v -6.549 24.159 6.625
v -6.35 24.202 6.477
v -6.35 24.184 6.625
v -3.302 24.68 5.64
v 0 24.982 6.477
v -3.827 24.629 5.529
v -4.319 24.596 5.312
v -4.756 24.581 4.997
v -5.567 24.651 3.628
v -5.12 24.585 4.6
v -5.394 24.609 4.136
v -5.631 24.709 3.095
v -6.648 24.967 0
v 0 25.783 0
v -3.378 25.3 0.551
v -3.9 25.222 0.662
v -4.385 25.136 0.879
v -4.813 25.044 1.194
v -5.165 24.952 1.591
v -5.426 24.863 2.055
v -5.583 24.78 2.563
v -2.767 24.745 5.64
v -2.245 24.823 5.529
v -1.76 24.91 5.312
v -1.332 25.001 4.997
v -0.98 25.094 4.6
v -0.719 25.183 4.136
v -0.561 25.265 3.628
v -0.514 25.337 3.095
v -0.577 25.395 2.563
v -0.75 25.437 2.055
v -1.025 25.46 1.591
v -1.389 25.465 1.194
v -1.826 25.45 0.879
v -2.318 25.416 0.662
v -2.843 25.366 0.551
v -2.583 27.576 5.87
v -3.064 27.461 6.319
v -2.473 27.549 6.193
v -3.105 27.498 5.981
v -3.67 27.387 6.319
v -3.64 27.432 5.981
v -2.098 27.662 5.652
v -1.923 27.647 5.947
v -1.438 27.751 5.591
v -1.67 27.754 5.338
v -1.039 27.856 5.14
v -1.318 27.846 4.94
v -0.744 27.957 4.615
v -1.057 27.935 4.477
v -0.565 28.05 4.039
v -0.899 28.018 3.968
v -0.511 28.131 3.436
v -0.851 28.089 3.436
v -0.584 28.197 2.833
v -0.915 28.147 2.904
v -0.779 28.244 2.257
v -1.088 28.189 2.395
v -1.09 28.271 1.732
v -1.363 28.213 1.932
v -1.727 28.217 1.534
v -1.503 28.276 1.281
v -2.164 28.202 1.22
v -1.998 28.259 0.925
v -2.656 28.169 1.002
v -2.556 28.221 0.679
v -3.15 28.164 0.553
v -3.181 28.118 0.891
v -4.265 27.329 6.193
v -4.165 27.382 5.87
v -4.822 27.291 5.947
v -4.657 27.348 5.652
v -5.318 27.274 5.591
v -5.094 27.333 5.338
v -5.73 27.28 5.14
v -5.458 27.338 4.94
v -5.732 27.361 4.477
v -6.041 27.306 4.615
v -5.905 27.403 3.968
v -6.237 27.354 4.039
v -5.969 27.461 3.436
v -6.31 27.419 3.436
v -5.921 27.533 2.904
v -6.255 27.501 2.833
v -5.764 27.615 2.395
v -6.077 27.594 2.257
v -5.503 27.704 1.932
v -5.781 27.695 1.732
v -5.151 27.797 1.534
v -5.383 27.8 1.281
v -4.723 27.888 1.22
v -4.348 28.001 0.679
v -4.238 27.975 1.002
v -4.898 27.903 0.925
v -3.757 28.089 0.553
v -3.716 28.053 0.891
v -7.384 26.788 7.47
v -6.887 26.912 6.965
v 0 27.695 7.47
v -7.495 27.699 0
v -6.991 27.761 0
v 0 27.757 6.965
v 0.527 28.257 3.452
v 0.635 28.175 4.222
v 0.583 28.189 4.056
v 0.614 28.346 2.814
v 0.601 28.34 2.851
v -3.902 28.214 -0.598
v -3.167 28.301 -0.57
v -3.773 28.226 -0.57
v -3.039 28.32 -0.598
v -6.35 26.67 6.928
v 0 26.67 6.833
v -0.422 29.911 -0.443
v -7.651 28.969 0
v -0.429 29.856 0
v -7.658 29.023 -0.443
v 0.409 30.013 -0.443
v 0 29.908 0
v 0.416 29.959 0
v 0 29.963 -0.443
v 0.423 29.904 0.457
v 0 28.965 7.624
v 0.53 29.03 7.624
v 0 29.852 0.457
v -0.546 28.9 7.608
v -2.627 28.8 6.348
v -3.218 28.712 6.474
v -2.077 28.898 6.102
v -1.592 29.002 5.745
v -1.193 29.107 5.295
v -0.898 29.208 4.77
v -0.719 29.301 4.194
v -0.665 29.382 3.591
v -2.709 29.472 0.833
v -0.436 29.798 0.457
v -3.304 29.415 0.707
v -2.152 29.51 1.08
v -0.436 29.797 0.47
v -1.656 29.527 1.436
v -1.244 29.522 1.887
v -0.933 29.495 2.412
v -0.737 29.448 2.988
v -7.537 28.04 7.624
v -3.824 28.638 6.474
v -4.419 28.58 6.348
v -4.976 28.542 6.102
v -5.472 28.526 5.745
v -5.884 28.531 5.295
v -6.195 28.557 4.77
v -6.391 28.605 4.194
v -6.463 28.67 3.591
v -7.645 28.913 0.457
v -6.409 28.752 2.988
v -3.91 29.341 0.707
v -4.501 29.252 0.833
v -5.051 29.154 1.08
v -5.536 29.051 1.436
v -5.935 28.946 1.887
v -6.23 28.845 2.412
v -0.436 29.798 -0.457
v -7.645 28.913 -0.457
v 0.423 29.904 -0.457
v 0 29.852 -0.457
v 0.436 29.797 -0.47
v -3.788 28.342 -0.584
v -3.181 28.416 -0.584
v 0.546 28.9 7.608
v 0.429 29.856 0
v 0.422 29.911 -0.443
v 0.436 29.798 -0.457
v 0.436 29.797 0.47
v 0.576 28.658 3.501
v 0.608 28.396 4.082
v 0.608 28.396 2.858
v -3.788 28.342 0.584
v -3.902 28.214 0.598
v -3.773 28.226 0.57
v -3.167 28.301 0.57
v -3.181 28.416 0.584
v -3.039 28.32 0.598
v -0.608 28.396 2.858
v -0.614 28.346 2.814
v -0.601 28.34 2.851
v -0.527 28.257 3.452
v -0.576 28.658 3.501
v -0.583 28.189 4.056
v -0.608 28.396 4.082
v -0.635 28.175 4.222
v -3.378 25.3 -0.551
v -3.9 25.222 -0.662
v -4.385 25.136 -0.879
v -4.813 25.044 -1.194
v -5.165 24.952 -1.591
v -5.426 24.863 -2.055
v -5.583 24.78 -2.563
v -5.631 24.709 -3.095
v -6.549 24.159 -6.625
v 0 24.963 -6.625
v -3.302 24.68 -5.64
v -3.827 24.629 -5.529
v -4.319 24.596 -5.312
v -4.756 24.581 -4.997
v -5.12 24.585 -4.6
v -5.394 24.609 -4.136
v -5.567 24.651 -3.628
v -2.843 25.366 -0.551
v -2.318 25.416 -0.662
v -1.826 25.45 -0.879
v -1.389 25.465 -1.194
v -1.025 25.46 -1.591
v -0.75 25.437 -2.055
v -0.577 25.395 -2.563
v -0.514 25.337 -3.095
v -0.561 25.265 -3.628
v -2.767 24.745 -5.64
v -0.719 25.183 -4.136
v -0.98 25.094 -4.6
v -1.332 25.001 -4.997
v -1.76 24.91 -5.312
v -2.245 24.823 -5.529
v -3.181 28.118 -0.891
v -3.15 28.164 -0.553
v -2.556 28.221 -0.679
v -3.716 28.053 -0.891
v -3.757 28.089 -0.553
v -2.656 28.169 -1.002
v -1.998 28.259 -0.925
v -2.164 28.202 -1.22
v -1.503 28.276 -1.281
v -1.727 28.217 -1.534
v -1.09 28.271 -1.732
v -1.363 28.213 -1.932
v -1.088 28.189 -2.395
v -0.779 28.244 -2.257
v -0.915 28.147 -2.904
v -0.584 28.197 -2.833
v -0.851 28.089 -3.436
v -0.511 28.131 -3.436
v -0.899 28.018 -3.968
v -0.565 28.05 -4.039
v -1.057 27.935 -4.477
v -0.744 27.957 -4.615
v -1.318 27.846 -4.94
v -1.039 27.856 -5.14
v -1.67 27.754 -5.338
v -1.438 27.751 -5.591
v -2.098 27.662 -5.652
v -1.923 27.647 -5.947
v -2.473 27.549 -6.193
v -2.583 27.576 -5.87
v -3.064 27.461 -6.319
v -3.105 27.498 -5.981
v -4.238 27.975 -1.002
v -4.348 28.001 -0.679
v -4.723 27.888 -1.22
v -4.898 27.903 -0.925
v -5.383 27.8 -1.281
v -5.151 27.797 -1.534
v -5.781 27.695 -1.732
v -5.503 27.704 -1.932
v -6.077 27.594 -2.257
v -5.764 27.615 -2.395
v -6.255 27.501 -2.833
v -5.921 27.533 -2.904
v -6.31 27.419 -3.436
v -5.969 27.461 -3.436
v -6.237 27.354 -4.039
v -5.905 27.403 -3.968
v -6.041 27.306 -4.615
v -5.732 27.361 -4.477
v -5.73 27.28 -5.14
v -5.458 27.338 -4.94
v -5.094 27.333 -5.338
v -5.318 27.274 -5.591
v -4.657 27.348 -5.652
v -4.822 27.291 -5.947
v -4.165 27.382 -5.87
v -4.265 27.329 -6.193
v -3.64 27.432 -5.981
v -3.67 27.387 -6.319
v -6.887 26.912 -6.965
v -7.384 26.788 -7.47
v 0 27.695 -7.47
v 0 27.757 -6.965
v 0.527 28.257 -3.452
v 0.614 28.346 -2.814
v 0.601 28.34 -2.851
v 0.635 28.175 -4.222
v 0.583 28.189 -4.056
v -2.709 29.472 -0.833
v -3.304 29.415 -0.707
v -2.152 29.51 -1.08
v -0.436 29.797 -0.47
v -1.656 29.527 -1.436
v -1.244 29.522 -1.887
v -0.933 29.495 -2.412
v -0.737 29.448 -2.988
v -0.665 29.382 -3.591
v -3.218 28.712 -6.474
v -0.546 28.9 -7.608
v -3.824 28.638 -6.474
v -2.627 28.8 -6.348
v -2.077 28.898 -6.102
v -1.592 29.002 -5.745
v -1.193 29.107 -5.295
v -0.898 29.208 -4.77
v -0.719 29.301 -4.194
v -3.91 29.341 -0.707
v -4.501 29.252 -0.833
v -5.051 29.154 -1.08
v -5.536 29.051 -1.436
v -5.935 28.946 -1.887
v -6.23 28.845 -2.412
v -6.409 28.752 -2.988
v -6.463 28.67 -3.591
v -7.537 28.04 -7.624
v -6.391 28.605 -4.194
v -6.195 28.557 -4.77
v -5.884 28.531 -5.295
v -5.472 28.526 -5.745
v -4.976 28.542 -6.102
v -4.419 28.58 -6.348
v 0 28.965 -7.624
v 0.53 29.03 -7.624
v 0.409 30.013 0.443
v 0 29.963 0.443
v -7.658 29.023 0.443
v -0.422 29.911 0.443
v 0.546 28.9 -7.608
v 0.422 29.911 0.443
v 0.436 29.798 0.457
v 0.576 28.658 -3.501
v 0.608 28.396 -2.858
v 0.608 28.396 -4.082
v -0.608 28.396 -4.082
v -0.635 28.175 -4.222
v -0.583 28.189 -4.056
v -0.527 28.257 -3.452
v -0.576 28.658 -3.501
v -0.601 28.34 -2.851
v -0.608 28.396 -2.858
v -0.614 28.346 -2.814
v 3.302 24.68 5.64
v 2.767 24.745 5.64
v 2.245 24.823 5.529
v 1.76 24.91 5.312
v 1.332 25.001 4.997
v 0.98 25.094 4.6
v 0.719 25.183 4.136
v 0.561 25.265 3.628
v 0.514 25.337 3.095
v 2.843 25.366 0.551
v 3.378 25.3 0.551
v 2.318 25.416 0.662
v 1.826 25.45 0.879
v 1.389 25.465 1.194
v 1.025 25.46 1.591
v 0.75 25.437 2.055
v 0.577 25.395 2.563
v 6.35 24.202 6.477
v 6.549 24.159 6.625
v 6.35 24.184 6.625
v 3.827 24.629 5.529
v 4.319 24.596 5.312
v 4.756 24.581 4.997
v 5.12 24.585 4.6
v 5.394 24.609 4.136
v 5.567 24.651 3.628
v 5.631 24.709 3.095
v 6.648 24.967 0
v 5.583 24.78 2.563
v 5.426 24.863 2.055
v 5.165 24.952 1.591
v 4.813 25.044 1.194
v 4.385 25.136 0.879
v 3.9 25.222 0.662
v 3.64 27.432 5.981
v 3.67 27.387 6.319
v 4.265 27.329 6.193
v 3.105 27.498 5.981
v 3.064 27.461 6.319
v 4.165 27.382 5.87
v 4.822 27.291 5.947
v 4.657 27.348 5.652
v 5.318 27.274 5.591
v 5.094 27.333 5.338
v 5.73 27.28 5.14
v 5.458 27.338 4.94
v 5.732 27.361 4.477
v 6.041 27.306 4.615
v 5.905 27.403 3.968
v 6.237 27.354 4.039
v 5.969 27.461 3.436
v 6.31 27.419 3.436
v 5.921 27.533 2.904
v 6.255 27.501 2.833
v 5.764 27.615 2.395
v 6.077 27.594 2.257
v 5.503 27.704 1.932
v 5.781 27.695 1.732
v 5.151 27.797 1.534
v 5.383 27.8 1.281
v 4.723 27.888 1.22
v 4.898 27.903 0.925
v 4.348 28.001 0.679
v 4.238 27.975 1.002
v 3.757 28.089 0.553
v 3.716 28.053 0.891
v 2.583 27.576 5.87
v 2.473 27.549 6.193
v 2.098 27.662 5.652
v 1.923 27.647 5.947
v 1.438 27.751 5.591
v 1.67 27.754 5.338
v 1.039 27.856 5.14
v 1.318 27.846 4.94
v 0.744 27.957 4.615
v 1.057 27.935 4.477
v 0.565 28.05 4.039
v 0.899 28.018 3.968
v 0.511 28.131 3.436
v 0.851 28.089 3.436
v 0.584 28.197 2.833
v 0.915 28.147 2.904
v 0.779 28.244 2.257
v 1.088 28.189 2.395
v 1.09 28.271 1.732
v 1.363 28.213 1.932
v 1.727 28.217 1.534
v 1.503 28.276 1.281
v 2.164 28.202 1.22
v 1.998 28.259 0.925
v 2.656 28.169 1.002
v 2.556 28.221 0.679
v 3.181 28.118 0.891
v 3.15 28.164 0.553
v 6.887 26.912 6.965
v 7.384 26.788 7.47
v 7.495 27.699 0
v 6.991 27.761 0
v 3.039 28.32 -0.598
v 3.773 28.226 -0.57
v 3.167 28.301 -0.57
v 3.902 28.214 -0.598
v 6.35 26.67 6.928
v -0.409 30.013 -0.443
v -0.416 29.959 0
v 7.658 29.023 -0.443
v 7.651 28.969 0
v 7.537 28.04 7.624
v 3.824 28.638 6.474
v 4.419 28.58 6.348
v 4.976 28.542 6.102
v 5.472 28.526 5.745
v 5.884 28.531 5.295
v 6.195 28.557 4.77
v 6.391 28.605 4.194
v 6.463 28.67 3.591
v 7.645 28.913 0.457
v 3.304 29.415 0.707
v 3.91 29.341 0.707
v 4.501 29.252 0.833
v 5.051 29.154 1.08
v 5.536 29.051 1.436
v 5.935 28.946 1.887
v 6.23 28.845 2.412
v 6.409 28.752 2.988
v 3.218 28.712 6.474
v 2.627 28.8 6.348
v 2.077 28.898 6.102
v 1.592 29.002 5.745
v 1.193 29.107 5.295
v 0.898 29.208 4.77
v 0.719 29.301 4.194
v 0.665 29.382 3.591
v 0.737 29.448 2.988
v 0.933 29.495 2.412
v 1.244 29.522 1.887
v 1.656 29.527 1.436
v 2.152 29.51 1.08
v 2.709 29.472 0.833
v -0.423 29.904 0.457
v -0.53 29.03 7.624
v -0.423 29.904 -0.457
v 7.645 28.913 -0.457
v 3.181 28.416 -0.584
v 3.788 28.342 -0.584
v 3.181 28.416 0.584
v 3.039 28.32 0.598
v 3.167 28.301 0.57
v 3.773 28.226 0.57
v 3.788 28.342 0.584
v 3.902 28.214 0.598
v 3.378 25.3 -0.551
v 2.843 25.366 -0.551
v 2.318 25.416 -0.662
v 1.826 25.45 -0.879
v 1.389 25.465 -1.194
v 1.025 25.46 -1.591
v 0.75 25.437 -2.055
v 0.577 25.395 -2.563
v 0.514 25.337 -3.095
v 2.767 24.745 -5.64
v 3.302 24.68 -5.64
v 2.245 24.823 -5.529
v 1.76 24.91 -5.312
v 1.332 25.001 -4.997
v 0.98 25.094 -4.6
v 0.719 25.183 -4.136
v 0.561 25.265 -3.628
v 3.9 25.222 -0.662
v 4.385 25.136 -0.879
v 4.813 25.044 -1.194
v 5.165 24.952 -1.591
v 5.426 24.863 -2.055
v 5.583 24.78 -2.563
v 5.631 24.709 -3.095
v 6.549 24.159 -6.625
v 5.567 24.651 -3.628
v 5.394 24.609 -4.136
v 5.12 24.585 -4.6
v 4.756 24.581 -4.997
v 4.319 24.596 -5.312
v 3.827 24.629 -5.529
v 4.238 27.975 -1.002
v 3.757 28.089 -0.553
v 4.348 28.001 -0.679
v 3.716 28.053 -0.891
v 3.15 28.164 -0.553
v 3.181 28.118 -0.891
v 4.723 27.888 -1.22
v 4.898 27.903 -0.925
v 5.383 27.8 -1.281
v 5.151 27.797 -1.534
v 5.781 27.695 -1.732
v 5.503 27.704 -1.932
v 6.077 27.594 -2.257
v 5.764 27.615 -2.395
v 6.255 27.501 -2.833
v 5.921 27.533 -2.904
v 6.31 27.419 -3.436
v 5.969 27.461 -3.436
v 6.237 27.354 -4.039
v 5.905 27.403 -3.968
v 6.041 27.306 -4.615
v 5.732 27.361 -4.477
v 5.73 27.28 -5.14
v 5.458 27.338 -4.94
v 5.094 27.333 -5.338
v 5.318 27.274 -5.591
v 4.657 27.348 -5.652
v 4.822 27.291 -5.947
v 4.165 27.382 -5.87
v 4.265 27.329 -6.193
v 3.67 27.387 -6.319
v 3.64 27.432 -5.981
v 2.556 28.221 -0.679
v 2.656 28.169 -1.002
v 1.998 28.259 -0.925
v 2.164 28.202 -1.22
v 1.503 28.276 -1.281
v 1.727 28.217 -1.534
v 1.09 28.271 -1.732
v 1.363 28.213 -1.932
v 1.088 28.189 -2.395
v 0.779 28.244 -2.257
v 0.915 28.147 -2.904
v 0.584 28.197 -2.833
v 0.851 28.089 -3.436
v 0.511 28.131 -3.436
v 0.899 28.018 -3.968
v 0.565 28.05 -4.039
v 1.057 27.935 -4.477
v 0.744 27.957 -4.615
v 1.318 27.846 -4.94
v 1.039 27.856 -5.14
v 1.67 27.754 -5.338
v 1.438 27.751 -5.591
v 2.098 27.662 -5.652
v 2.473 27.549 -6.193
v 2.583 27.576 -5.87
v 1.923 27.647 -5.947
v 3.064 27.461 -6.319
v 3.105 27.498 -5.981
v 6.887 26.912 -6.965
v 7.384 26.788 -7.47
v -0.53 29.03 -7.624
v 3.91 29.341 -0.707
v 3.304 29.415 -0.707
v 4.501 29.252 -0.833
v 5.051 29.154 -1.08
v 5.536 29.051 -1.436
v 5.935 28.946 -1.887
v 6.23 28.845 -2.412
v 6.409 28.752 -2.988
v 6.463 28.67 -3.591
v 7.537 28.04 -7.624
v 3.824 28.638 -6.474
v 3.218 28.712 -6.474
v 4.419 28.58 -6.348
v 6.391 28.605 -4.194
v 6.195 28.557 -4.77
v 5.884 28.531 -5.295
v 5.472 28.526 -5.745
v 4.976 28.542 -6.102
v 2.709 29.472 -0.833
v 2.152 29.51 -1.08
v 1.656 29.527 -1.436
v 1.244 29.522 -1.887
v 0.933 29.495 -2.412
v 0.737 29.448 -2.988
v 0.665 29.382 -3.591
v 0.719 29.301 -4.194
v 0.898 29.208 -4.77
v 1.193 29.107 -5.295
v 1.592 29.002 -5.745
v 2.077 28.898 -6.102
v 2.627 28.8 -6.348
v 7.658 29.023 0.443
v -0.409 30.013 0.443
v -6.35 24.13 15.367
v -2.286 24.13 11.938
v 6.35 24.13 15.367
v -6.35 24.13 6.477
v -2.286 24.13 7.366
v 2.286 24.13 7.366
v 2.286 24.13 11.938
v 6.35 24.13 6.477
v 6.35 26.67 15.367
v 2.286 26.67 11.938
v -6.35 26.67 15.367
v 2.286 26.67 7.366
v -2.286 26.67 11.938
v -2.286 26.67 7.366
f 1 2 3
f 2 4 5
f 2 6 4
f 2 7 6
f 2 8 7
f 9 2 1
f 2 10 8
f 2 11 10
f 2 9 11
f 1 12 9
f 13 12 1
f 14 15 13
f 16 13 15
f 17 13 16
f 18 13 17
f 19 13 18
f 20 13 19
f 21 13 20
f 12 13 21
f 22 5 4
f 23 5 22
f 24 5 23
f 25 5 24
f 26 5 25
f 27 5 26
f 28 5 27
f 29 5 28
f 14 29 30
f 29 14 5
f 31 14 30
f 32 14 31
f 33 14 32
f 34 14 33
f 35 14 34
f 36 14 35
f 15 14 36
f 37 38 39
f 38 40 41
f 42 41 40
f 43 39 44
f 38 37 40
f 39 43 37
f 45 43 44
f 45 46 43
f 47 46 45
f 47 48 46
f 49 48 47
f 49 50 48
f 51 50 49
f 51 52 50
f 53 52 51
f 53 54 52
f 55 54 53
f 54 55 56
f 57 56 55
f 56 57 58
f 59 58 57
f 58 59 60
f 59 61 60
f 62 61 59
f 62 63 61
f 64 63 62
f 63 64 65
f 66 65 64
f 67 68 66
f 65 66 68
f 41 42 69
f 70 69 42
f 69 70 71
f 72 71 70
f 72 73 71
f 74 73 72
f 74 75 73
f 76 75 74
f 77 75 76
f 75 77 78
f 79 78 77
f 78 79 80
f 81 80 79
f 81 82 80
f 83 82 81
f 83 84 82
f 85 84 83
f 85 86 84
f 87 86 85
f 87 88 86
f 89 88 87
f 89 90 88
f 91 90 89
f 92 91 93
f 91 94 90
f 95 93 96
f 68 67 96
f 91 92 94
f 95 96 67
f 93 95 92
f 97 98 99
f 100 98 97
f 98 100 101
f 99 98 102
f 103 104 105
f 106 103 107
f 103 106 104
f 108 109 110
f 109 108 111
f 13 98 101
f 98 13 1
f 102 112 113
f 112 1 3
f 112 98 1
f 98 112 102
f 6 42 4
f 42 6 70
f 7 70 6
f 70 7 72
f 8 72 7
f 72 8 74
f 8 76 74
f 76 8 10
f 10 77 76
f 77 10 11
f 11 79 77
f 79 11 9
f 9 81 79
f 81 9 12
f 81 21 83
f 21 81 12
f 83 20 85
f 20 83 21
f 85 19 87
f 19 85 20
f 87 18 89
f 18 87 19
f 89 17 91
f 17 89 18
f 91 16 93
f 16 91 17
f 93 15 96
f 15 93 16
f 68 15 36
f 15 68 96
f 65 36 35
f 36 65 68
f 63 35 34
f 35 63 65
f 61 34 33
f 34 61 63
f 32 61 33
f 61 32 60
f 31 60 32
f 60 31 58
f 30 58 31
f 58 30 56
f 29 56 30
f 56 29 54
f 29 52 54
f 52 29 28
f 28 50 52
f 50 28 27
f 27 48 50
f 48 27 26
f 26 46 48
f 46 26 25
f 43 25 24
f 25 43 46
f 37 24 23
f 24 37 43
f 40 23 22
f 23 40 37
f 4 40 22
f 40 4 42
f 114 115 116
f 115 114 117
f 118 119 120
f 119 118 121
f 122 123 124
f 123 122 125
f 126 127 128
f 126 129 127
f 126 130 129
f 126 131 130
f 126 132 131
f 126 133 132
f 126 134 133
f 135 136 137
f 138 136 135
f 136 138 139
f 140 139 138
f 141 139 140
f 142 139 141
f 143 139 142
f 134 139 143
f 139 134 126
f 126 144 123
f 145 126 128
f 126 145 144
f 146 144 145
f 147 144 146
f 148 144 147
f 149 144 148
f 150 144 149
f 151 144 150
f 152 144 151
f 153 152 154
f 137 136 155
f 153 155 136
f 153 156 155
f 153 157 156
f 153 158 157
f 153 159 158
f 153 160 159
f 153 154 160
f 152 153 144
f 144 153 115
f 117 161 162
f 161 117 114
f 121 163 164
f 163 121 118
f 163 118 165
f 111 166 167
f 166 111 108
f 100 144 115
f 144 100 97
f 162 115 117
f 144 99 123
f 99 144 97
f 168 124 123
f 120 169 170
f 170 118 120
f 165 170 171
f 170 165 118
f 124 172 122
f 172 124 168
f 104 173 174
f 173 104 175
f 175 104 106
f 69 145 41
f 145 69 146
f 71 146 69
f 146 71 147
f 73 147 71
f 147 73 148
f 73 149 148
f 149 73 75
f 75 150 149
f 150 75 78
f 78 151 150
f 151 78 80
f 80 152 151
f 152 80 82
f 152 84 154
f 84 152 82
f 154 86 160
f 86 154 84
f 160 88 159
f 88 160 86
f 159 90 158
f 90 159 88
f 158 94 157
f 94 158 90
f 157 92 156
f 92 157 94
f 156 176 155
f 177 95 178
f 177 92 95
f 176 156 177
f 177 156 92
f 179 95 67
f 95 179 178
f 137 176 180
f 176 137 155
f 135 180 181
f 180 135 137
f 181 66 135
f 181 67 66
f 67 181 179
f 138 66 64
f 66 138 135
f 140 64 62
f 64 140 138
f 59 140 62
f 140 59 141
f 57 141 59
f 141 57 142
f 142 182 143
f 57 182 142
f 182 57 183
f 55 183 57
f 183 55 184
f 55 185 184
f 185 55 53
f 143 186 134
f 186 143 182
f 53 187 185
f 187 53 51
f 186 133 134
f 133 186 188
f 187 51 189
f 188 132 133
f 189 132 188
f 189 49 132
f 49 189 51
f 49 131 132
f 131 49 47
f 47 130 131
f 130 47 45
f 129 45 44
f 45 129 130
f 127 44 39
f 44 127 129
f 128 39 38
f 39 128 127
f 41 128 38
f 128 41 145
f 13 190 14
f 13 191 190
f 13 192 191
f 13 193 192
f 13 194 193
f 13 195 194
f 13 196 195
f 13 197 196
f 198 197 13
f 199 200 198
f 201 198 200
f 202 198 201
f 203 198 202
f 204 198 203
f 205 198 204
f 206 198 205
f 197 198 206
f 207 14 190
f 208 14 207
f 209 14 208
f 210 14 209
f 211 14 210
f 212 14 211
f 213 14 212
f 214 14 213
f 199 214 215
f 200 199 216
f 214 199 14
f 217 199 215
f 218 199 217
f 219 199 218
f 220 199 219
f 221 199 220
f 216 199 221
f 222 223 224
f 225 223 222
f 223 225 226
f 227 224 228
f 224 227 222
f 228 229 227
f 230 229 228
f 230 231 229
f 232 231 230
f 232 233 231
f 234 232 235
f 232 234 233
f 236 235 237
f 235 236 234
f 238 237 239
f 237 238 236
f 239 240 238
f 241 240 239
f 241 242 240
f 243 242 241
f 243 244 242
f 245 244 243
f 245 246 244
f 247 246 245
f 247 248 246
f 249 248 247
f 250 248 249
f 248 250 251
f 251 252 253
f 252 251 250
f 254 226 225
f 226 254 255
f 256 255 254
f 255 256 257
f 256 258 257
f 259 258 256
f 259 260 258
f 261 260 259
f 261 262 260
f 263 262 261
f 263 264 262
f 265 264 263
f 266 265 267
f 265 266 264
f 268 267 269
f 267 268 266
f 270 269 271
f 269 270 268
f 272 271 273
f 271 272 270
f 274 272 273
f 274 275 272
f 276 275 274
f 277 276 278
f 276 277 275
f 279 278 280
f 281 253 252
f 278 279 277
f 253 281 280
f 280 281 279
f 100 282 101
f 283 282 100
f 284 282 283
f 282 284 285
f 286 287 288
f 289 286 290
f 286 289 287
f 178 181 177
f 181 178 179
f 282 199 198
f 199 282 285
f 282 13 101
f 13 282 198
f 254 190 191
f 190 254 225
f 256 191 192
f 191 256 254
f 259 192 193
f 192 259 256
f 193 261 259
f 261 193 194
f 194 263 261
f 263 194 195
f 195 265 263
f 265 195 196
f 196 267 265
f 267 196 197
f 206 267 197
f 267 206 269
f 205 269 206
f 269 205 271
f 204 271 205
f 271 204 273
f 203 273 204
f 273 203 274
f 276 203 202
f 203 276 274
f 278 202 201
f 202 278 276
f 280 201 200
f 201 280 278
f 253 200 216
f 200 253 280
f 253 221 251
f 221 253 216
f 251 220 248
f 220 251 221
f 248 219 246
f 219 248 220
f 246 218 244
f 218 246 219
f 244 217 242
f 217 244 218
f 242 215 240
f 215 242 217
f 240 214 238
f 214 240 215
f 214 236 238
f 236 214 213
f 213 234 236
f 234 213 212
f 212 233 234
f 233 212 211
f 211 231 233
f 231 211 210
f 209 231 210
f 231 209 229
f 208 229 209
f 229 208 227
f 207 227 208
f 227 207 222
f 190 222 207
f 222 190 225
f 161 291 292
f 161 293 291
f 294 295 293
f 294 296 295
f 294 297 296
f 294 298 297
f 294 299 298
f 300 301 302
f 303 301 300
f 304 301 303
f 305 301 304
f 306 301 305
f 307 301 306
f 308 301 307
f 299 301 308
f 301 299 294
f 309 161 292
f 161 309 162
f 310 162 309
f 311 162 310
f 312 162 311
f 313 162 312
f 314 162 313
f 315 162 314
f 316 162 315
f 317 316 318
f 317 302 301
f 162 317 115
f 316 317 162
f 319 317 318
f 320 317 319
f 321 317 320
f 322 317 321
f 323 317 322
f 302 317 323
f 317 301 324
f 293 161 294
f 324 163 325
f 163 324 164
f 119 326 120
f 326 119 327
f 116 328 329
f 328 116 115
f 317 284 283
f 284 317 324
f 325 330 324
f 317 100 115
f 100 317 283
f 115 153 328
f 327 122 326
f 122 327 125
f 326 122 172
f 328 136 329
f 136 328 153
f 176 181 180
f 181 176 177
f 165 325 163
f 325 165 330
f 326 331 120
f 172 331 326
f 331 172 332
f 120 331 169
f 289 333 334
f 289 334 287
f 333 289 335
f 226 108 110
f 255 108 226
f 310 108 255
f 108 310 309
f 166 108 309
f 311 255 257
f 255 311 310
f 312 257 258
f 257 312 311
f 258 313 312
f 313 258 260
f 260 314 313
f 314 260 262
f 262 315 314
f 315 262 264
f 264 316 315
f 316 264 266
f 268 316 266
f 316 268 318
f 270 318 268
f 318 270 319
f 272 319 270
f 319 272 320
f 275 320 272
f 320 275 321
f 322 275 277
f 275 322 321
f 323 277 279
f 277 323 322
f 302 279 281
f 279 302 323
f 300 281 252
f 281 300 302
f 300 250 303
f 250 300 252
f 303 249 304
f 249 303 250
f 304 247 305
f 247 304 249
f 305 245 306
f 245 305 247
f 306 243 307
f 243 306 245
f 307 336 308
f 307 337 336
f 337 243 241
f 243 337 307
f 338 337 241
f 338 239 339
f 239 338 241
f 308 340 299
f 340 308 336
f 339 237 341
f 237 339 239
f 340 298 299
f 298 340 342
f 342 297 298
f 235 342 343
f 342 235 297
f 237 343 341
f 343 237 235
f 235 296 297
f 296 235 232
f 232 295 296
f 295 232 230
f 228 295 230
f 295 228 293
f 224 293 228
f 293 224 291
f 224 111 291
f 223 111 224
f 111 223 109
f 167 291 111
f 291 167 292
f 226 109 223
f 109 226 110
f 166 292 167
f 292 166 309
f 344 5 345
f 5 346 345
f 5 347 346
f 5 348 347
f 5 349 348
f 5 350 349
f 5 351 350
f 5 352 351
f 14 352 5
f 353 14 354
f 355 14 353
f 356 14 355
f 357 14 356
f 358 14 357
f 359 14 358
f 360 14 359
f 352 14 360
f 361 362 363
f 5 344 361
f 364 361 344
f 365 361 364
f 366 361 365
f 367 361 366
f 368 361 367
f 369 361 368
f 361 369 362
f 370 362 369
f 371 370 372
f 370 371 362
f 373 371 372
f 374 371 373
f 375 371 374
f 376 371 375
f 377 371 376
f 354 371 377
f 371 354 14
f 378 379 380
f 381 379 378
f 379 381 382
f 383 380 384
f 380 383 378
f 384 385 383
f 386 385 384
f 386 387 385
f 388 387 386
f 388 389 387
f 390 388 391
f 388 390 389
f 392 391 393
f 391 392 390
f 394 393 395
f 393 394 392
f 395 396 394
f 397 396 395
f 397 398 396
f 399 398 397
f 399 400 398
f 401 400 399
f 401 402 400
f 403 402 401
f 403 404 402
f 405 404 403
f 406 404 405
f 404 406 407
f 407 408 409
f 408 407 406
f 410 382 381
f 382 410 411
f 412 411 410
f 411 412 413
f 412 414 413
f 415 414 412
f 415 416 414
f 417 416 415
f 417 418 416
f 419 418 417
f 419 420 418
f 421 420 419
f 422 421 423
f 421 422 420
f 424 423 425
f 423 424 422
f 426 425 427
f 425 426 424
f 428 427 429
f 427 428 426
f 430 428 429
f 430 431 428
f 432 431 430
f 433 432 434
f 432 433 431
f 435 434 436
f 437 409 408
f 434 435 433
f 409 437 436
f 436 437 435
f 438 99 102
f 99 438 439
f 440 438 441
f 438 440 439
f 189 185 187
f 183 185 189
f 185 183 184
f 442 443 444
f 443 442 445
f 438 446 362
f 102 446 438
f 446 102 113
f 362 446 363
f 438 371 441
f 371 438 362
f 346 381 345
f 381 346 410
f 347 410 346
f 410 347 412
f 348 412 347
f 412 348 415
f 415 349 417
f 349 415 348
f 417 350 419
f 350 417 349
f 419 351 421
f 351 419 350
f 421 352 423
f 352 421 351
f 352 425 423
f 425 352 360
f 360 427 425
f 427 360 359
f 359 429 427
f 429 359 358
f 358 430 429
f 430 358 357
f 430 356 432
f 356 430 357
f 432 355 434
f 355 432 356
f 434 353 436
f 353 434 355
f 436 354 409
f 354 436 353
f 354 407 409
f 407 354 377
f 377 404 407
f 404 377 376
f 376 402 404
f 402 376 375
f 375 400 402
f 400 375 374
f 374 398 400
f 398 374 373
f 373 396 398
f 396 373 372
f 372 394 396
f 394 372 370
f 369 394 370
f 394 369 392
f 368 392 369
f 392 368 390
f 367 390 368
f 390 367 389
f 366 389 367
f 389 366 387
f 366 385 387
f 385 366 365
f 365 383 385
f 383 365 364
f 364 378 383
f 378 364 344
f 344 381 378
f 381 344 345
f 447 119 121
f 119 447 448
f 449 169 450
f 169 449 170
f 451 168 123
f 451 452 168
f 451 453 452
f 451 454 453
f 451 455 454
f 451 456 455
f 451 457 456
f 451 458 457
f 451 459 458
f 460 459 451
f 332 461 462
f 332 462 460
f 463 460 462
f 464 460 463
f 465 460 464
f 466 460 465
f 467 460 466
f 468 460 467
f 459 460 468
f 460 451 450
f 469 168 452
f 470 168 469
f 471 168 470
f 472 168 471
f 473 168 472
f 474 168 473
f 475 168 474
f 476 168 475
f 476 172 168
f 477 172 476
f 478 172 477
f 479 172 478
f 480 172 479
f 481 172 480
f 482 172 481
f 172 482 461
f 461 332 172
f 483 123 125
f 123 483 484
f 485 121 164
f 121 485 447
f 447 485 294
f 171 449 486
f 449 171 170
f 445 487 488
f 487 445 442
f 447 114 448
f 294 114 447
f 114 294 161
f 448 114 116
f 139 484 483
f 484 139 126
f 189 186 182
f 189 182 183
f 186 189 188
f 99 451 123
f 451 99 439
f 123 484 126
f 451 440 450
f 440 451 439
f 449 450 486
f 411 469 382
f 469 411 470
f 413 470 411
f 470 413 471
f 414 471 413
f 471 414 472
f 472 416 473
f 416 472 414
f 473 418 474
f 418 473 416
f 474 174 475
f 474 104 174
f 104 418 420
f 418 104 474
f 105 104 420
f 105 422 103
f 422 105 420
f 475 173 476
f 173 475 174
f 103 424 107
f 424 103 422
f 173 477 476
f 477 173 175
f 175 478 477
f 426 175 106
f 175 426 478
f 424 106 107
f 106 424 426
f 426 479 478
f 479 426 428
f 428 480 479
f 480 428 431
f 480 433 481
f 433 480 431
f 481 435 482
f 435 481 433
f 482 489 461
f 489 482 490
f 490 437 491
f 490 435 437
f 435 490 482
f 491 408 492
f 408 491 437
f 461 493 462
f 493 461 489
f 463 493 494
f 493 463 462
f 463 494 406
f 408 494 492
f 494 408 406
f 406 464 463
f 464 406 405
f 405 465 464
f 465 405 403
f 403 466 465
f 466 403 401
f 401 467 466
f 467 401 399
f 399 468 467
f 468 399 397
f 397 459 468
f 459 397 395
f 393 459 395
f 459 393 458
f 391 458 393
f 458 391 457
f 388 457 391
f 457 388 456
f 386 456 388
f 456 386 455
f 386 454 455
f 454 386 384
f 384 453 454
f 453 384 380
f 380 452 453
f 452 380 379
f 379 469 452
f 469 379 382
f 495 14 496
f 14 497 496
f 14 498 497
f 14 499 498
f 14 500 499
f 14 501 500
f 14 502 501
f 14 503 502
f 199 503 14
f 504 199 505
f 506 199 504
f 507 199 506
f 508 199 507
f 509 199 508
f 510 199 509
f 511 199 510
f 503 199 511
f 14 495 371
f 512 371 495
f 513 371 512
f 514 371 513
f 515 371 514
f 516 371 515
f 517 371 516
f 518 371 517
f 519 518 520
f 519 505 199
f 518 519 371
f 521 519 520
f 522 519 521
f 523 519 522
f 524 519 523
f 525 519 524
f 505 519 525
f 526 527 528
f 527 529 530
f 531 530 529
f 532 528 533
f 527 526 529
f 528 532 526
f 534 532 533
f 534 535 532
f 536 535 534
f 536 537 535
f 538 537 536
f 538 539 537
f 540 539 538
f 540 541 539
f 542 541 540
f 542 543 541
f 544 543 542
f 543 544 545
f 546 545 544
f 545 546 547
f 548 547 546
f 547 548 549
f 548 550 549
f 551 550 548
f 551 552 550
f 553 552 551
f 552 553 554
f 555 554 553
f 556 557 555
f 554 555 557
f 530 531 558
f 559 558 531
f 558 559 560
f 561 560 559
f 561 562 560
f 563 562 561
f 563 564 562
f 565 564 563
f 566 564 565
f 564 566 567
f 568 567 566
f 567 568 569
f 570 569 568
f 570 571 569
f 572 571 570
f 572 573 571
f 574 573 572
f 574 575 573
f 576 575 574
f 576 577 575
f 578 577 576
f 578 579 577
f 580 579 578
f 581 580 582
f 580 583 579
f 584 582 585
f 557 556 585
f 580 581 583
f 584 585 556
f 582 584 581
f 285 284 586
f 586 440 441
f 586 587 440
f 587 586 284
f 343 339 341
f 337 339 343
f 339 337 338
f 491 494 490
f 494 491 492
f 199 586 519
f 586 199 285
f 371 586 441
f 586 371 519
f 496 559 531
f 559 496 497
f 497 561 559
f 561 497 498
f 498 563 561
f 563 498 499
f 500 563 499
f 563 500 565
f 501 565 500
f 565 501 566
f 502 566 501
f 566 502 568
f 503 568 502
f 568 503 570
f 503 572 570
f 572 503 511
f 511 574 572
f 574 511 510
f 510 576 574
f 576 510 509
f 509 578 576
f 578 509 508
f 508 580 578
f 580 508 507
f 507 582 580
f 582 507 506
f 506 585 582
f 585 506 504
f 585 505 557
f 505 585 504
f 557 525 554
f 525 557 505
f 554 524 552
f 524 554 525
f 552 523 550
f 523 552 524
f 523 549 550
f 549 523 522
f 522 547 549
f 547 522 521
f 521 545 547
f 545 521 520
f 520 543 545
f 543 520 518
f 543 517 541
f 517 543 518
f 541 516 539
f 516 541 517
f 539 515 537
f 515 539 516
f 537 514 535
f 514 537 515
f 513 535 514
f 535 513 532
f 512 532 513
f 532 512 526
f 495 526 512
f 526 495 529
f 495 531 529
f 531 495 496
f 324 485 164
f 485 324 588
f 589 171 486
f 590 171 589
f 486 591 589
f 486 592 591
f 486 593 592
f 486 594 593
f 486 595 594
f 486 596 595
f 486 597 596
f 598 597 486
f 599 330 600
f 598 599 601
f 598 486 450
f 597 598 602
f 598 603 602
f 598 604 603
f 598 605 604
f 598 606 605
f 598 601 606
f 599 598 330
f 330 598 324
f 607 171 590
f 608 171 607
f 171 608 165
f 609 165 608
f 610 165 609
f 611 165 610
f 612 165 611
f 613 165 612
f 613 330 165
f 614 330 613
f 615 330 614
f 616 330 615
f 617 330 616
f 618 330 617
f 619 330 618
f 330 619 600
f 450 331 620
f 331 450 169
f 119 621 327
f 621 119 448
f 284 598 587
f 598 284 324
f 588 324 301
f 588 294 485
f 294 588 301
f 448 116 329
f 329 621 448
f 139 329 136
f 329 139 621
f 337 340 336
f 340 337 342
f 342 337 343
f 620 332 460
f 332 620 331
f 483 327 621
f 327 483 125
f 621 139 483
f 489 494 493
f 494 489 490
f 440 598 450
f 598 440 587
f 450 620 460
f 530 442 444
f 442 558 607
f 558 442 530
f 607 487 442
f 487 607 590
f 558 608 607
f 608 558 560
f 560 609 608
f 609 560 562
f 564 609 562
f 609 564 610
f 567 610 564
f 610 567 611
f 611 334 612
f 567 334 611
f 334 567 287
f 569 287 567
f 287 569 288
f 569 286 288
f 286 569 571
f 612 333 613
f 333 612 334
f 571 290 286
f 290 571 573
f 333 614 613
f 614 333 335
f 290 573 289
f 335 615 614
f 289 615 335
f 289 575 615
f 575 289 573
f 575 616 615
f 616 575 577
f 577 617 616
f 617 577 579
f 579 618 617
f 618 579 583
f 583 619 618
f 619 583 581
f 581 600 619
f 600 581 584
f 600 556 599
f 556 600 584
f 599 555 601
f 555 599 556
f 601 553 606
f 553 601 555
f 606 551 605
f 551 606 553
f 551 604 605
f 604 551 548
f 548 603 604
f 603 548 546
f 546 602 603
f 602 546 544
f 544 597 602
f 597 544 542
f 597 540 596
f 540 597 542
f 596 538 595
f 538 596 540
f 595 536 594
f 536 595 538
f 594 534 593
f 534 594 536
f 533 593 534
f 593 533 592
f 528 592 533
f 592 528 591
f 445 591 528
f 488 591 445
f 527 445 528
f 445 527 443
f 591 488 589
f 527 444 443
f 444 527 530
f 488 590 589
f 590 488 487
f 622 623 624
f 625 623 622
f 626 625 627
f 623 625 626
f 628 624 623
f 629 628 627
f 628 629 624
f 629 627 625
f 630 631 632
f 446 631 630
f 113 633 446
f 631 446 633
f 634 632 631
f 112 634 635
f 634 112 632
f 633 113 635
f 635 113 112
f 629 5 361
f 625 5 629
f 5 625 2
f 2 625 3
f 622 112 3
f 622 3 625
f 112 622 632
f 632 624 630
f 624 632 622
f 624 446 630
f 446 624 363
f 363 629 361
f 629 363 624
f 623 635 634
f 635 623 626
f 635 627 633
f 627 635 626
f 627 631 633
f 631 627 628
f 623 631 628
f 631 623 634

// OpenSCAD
ViewScale = [0.0254, 0.0254, 0.0254];

module oneLED()
{
    LedD = 203;
    LedLen = 110;
    LipDepth = 50;
    LipDia = 230;

    translate([0, 1000, 0])
    rotate([-90, 0, 0]){
    linear_extrude(LedLen)
    difference() {
    square(280, center=true);
    circle(LedD/2, center=true);
    }
    translate([0, 0, 110])
    linear_extrude(LipDepth)
    difference() {
    square(320, center=true);
    circle(LipDia/2, center=true);
    }}
}

module mount()
{
    rotate([-90, 0, 0])
    linear_extrude(100)
    difference() {
    square([500, 350], center = true);
    translate([0, 50, 0])
    square(180,center=true);
    }
}

scale(ViewScale)
{
    rot = 7;
    rotate([rot, 0, rot]) oneLED();
    rotate([-rot, 0, rot]) oneLED();
    rotate([rot, 0, -rot]) oneLED();
    rotate([-rot, 0, -rot]) oneLED();
    translate([0, 950, 430])
    mount();
}
